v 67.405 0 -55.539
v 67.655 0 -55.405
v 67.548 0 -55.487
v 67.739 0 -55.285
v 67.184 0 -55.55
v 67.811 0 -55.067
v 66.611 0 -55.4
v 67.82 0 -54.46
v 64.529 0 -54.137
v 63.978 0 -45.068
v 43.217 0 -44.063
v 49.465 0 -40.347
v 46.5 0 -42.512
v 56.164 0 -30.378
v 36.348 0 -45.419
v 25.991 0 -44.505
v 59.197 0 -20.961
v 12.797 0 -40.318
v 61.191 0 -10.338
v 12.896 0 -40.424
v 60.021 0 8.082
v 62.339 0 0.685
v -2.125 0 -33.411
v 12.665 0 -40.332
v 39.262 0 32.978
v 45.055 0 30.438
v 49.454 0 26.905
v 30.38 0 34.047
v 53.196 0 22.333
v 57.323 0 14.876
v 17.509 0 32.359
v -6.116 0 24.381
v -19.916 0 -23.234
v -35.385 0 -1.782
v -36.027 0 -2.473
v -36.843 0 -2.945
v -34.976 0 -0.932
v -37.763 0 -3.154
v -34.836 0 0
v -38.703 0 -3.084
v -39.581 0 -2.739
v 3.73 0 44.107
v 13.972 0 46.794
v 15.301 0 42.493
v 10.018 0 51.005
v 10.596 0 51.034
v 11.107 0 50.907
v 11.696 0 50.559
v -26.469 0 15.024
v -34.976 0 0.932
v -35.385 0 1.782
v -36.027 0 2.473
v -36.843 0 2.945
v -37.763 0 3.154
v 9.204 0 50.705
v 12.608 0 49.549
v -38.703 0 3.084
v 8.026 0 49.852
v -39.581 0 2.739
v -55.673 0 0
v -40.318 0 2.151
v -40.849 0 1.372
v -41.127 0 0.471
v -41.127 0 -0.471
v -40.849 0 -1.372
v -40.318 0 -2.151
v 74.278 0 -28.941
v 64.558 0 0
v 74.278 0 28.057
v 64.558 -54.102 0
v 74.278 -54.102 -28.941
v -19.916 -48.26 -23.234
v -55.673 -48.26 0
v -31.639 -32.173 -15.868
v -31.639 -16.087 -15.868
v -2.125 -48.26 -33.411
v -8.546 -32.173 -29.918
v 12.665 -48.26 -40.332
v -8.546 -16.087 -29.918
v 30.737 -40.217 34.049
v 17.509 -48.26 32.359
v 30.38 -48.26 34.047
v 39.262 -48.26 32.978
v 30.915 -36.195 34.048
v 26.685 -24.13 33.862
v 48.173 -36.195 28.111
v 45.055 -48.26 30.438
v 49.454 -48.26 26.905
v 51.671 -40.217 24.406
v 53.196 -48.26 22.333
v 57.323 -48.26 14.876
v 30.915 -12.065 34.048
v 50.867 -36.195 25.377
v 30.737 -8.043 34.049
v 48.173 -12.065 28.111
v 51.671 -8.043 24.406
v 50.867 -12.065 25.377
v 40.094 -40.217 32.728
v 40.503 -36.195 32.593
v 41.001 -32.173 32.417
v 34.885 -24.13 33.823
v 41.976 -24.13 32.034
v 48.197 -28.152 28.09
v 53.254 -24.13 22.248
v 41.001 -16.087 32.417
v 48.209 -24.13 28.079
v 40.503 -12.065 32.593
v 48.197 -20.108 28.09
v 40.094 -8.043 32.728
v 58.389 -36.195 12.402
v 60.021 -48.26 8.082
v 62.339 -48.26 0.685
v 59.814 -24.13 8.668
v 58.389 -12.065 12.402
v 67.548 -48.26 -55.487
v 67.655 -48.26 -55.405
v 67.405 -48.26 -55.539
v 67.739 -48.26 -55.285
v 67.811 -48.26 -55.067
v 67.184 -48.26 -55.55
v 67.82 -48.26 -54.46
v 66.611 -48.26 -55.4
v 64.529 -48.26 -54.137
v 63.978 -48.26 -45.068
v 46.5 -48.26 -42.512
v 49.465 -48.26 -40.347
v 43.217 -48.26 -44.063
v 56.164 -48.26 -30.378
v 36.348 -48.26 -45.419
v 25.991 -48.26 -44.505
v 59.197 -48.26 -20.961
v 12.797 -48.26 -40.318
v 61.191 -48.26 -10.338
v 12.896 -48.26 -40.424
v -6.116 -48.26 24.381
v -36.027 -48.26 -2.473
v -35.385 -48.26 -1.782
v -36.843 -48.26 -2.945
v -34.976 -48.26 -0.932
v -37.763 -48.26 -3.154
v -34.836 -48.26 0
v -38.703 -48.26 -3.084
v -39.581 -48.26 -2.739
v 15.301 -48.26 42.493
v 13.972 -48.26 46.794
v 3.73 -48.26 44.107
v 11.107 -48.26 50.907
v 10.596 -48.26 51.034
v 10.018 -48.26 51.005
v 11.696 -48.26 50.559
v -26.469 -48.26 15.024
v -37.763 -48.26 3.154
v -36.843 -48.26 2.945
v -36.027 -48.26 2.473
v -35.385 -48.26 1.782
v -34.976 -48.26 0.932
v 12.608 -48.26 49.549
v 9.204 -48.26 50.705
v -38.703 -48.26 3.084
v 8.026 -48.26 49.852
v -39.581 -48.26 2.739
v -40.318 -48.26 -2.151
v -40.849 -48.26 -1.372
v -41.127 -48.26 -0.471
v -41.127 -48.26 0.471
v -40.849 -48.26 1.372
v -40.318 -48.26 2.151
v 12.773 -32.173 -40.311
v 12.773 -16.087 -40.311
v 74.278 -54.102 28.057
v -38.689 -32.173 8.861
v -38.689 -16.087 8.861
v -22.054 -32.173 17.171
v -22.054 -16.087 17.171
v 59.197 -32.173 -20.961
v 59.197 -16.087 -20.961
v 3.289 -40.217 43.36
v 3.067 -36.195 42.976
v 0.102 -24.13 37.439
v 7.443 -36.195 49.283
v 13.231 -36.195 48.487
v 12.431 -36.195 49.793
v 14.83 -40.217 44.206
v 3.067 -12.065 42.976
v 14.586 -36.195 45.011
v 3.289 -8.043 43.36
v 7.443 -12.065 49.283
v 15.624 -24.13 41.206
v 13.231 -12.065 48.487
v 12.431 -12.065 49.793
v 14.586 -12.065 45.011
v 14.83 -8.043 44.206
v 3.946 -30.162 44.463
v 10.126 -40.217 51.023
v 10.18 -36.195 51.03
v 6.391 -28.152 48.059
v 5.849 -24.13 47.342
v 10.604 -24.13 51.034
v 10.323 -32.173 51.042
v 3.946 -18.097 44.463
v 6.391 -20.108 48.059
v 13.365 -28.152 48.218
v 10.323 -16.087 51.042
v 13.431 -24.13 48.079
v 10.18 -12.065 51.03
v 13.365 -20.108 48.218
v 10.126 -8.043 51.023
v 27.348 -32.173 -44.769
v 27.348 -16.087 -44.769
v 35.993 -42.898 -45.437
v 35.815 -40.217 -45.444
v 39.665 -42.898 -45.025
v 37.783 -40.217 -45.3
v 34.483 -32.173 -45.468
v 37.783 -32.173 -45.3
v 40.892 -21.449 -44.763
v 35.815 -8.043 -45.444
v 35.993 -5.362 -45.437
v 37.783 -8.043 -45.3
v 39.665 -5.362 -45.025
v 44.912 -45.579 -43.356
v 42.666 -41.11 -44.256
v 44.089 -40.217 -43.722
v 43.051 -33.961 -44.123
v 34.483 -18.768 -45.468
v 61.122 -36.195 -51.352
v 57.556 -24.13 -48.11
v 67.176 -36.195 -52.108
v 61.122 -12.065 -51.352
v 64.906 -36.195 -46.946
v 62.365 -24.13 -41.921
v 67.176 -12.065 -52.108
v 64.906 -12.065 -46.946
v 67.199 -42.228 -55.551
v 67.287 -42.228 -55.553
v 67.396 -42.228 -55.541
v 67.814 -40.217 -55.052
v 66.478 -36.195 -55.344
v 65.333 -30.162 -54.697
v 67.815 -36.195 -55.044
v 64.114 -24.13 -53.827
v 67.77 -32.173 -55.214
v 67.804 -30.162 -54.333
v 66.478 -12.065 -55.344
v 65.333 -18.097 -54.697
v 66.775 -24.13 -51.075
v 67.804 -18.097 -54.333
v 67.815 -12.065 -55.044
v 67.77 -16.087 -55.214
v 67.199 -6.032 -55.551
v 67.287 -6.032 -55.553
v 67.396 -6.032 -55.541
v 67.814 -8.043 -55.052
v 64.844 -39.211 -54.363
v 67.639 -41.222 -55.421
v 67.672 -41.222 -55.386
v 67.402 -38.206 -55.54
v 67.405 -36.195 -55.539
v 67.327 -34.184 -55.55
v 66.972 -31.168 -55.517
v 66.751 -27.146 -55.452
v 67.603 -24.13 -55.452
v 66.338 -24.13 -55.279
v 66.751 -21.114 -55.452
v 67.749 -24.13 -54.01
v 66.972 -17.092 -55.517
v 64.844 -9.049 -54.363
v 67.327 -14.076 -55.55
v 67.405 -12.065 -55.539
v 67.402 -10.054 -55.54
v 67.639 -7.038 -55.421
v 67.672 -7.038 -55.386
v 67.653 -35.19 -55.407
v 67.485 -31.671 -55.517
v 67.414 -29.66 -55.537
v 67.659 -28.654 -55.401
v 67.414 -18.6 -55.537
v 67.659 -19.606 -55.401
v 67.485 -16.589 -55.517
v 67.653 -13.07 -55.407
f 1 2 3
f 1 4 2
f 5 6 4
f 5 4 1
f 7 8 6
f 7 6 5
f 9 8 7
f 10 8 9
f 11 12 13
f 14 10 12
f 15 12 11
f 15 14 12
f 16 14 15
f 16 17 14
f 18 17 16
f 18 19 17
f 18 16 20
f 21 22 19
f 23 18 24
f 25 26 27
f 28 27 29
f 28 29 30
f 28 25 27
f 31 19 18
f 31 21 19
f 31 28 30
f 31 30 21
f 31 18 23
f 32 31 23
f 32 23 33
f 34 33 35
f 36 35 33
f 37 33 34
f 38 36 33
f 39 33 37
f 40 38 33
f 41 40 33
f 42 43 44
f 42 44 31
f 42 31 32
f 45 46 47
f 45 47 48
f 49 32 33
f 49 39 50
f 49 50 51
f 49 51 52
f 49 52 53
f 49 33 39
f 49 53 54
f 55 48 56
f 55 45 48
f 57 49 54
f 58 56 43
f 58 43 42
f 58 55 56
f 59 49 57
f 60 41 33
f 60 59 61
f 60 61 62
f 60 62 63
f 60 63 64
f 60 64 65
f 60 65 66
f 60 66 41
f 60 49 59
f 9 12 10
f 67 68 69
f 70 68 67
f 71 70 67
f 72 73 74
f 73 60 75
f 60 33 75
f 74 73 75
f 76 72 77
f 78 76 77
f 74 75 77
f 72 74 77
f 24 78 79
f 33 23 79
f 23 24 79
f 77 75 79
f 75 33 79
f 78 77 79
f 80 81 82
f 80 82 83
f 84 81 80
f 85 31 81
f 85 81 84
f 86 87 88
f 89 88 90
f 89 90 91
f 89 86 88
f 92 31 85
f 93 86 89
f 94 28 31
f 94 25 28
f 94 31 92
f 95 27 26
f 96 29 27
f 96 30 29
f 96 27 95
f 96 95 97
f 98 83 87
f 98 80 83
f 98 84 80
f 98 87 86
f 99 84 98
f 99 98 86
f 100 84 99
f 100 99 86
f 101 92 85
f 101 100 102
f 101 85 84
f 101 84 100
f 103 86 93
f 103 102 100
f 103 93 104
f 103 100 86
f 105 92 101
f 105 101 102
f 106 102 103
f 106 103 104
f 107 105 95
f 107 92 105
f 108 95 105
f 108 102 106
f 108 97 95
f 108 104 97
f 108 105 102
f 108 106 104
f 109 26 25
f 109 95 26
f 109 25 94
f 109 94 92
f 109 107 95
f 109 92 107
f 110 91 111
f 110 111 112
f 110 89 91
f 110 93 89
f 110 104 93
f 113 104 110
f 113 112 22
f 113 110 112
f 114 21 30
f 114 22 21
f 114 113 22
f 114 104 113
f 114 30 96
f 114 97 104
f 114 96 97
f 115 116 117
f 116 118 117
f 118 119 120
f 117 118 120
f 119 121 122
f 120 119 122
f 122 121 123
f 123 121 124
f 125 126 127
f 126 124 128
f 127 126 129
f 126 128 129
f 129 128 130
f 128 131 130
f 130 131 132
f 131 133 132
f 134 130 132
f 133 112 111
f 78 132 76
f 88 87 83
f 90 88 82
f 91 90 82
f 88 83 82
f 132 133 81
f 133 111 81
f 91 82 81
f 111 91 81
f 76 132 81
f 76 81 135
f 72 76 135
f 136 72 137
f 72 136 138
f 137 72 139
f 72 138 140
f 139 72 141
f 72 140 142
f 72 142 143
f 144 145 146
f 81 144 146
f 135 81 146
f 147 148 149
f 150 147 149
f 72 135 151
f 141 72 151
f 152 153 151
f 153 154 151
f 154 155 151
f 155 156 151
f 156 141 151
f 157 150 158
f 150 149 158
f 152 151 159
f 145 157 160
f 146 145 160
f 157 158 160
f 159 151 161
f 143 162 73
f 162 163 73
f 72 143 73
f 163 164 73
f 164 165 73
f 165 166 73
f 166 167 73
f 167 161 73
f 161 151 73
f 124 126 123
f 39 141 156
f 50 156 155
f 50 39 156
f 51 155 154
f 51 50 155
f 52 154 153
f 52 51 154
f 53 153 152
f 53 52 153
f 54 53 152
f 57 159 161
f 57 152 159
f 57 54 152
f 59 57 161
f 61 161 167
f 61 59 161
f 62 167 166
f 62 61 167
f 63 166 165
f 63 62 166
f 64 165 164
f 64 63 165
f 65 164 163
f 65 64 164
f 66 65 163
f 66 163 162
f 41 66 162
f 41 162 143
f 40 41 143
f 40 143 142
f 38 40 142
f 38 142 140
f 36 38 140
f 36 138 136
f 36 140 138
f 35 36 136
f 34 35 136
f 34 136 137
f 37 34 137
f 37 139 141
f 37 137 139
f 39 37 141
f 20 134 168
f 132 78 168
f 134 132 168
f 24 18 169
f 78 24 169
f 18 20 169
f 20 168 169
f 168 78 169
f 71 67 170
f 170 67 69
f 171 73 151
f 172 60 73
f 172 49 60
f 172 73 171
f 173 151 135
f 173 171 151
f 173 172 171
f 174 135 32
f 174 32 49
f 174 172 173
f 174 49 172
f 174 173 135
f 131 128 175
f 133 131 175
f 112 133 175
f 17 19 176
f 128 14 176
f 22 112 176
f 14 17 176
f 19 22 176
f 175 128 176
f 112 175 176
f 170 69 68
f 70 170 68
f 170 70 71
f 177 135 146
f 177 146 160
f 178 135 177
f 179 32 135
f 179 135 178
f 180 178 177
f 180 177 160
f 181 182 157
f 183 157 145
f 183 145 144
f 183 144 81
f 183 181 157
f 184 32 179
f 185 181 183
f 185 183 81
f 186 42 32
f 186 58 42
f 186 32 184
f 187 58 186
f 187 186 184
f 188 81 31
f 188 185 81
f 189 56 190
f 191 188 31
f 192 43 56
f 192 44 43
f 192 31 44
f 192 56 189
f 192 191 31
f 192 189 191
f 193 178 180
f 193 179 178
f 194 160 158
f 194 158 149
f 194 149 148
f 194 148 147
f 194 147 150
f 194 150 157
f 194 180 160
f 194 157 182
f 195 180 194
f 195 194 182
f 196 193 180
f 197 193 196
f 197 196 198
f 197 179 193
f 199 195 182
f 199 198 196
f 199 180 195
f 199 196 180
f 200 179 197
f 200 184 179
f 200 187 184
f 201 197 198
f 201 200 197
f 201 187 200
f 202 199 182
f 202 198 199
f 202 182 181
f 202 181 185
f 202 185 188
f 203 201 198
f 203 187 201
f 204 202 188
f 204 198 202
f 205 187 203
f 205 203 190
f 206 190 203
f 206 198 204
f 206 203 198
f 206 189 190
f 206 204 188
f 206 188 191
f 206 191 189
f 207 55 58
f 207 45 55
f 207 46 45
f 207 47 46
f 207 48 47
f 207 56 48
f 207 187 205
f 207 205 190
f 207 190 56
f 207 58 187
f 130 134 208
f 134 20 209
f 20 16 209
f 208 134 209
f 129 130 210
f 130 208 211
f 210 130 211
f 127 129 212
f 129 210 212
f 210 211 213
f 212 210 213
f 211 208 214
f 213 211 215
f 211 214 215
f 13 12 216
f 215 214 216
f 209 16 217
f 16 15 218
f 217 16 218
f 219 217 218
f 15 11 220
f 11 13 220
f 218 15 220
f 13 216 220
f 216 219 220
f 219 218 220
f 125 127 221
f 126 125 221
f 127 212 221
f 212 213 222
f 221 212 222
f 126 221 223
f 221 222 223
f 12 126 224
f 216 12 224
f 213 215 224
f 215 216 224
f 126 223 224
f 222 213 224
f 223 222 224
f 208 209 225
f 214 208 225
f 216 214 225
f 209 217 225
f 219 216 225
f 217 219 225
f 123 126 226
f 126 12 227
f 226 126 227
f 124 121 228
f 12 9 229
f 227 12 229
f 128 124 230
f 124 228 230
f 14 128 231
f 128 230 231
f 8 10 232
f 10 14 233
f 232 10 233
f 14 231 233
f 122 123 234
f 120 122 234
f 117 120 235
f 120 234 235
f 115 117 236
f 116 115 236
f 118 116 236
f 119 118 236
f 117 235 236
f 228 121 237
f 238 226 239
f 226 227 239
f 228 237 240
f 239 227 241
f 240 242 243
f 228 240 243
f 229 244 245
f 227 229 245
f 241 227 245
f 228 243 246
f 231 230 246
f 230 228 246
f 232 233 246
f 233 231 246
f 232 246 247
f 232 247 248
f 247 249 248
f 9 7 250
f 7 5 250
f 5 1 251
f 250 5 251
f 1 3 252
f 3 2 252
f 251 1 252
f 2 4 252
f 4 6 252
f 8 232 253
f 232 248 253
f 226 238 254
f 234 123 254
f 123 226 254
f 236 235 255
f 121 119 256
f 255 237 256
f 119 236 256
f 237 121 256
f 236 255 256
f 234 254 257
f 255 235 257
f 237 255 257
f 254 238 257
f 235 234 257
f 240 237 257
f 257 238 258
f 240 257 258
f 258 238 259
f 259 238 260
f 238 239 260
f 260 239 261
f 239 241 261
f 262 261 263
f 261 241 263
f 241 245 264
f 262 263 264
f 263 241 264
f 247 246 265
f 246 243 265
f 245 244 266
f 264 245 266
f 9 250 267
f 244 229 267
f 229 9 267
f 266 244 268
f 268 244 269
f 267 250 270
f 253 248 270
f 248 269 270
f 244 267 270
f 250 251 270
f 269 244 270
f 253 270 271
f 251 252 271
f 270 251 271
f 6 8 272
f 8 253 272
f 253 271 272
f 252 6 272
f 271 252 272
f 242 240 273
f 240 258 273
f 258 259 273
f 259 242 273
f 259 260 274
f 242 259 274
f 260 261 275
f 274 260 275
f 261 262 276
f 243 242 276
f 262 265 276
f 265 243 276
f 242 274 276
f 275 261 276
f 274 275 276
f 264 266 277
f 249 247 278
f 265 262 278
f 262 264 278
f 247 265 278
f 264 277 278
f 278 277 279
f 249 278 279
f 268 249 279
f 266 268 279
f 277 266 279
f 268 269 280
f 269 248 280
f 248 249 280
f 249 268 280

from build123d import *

# Parameters (mm, degrees)
F1_DEPTH = 48.26
F2_R     = 3.163158907
F3_DEPTH = 219.202
F7_DEPTH = 54.102


# Not quite as in the source:
# - the program builds the solid bodies; features that only make, move or delete a surface that nothing else refers to are left out


with BuildPart() as f1:
    # F0 (on Front) → F1 (new body)
    with BuildSketch(Plane.XZ):
        with BuildLine():
            add(Edge.make_bspline(
                [(-55.6729212403, 0), (-38.6311113221, 8.9523120314), (-21.5893014039, 17.9046240629), (-6.1160224097, 24.3814345232)],
                knots=[0, 0, 0, 0, 0.2526308872, 0.2526308872, 0.2526308872, 0.2526308872], degree=3))
            add(Edge.make_bspline(
                [(-55.6729212403, 0), (-31.4820105475, -16.1714644762), (-7.2910998546, -32.3429289523), (12.6646309673, -40.3317198143)],
                knots=[0, 0, 0, 0, 0.2592898959, 0.2592898959, 0.2592898959, 0.2592898959], degree=3))
            add(Edge.make_bspline(
                [(12.6646309673, -40.3317198143), (12.7977790108, -40.2702503671), (12.8467772947, -40.3473806791), (12.8960343857, -40.4240649186)],
                knots=[0.9475980683, 0.9475980683, 0.9475980683, 0.9475980683, 1, 1, 1, 1], degree=3))
            add(Edge.make_bspline(
                [(12.8960343857, -40.4240649186), (28.2628150861, -46.5369934422), (41.10024341, -47.763030362), (49.4649163881, -40.3473806791)],
                knots=[0.2602929484, 0.2602929484, 0.2602929484, 0.2602929484, 0.4602864698, 0.4602864698, 0.4602864698, 0.4602864698], degree=3))
            add(Edge.make_bspline(
                [(49.4649163881, -40.3473806791), (50.5850376596, -39.3543440149), (53.1057014839, -36.5716905465), (55.1277076242, -32.8255943911), (56.1638529866, -30.3775797313)],
                knots=[0.4602864698, 0.4602864698, 0.4602864698, 0.4602864698, 0.4870677915, 0.5252020603, 0.5252020603, 0.5252020603, 0.5252020603], degree=3))
            add(Edge.make_bspline(
                [(56.1638529866, -30.3775797313), (59.780967595, -21.8317232251), (61.5497398481, -10.2709798617), (62.3385554338, 0.6850550301)],
                knots=[0.5252020603, 0.5252020603, 0.5252020603, 0.5252020603, 0.658326259, 0.658326259, 0.658326259, 0.658326259], degree=3))
            add(Edge.make_bspline(
                [(17.5085796013, 32.359251714), (27.1297909673, 34.5637852704), (49.1028218124, 35.1002074944), (58.1974759597, 15.3115973831), (62.3385554338, 0.6850550301)],
                knots=[0.3901714972, 0.3901714972, 0.3901714972, 0.3901714972, 0.5729185448, 0.8708638911, 0.8708638911, 0.8708638911, 0.8708638911], degree=3))
            add(Edge.make_bspline(
                [(-6.1160224097, 24.3814345232), (2.3081424102, 27.9076243402), (10.2673831039, 30.7000572468), (17.5085796013, 32.359251714)],
                knots=[0.2526308872, 0.2526308872, 0.2526308872, 0.2526308872, 0.3901714972, 0.3901714972, 0.3901714972, 0.3901714972], degree=3))
        make_face()
        with BuildLine():
            add(Edge.make_bspline(
                [(-6.1160224097, 24.3814345232), (0.1635435456, 37.996667677), (11.5728562583, 62.1838548689), (15.6705155598, 41.5433244951), (17.5085796013, 32.359251714)],
                knots=[0, 0, 0, 0, 0.556951444, 1, 1, 1, 1], degree=3))
            add(Edge.make_bspline(
                [(-6.1160224097, 24.3814345232), (2.3081424102, 27.9076243402), (10.2673831039, 30.7000572468), (17.5085796013, 32.359251714)],
                knots=[0.2526308872, 0.2526308872, 0.2526308872, 0.2526308872, 0.3901714972, 0.3901714972, 0.3901714972, 0.3901714972], degree=3))
        make_face()
        with BuildLine():
            add(Edge.make_bspline(
                [(49.4649163881, -40.3473806791), (50.5850376596, -39.3543440149), (53.1057014839, -36.5716905465), (55.1277076242, -32.8255943911), (56.1638529866, -30.3775797313)],
                knots=[0.4602864698, 0.4602864698, 0.4602864698, 0.4602864698, 0.4870677915, 0.5252020603, 0.5252020603, 0.5252020603, 0.5252020603], degree=3))
            add(Edge.make_bspline(
                [(49.4649163881, -40.3473806791), (57.8118629624, -48.4510792467), (75.1782729057, -65.3113945884), (62.6635379474, -42.3189795748), (56.1638529866, -30.3775797313)],
                knots=[0, 0, 0, 0, 0.480637426, 1, 1, 1, 1], degree=3))
        make_face()
    extrude(amount=F1_DEPTH)

    # F2 (on Front) → F3 (cut)
    with BuildSketch(Plane.XZ):
        with Locations((-37.9989780486, 0)):
            Circle(F2_R)
    extrude(amount=F3_DEPTH, mode=Mode.SUBTRACT)


with BuildPart() as f7:
    # F4 (on Front) → F7 (new body)
    with BuildSketch(Plane.XZ):
        Polygon((74.2782354355, 28.057385236), (64.5575672388, 0), (74.2782354355, -28.9410892874), align=None)
    extrude(amount=F7_DEPTH)


solid = Compound([f1.part, f7.part])
